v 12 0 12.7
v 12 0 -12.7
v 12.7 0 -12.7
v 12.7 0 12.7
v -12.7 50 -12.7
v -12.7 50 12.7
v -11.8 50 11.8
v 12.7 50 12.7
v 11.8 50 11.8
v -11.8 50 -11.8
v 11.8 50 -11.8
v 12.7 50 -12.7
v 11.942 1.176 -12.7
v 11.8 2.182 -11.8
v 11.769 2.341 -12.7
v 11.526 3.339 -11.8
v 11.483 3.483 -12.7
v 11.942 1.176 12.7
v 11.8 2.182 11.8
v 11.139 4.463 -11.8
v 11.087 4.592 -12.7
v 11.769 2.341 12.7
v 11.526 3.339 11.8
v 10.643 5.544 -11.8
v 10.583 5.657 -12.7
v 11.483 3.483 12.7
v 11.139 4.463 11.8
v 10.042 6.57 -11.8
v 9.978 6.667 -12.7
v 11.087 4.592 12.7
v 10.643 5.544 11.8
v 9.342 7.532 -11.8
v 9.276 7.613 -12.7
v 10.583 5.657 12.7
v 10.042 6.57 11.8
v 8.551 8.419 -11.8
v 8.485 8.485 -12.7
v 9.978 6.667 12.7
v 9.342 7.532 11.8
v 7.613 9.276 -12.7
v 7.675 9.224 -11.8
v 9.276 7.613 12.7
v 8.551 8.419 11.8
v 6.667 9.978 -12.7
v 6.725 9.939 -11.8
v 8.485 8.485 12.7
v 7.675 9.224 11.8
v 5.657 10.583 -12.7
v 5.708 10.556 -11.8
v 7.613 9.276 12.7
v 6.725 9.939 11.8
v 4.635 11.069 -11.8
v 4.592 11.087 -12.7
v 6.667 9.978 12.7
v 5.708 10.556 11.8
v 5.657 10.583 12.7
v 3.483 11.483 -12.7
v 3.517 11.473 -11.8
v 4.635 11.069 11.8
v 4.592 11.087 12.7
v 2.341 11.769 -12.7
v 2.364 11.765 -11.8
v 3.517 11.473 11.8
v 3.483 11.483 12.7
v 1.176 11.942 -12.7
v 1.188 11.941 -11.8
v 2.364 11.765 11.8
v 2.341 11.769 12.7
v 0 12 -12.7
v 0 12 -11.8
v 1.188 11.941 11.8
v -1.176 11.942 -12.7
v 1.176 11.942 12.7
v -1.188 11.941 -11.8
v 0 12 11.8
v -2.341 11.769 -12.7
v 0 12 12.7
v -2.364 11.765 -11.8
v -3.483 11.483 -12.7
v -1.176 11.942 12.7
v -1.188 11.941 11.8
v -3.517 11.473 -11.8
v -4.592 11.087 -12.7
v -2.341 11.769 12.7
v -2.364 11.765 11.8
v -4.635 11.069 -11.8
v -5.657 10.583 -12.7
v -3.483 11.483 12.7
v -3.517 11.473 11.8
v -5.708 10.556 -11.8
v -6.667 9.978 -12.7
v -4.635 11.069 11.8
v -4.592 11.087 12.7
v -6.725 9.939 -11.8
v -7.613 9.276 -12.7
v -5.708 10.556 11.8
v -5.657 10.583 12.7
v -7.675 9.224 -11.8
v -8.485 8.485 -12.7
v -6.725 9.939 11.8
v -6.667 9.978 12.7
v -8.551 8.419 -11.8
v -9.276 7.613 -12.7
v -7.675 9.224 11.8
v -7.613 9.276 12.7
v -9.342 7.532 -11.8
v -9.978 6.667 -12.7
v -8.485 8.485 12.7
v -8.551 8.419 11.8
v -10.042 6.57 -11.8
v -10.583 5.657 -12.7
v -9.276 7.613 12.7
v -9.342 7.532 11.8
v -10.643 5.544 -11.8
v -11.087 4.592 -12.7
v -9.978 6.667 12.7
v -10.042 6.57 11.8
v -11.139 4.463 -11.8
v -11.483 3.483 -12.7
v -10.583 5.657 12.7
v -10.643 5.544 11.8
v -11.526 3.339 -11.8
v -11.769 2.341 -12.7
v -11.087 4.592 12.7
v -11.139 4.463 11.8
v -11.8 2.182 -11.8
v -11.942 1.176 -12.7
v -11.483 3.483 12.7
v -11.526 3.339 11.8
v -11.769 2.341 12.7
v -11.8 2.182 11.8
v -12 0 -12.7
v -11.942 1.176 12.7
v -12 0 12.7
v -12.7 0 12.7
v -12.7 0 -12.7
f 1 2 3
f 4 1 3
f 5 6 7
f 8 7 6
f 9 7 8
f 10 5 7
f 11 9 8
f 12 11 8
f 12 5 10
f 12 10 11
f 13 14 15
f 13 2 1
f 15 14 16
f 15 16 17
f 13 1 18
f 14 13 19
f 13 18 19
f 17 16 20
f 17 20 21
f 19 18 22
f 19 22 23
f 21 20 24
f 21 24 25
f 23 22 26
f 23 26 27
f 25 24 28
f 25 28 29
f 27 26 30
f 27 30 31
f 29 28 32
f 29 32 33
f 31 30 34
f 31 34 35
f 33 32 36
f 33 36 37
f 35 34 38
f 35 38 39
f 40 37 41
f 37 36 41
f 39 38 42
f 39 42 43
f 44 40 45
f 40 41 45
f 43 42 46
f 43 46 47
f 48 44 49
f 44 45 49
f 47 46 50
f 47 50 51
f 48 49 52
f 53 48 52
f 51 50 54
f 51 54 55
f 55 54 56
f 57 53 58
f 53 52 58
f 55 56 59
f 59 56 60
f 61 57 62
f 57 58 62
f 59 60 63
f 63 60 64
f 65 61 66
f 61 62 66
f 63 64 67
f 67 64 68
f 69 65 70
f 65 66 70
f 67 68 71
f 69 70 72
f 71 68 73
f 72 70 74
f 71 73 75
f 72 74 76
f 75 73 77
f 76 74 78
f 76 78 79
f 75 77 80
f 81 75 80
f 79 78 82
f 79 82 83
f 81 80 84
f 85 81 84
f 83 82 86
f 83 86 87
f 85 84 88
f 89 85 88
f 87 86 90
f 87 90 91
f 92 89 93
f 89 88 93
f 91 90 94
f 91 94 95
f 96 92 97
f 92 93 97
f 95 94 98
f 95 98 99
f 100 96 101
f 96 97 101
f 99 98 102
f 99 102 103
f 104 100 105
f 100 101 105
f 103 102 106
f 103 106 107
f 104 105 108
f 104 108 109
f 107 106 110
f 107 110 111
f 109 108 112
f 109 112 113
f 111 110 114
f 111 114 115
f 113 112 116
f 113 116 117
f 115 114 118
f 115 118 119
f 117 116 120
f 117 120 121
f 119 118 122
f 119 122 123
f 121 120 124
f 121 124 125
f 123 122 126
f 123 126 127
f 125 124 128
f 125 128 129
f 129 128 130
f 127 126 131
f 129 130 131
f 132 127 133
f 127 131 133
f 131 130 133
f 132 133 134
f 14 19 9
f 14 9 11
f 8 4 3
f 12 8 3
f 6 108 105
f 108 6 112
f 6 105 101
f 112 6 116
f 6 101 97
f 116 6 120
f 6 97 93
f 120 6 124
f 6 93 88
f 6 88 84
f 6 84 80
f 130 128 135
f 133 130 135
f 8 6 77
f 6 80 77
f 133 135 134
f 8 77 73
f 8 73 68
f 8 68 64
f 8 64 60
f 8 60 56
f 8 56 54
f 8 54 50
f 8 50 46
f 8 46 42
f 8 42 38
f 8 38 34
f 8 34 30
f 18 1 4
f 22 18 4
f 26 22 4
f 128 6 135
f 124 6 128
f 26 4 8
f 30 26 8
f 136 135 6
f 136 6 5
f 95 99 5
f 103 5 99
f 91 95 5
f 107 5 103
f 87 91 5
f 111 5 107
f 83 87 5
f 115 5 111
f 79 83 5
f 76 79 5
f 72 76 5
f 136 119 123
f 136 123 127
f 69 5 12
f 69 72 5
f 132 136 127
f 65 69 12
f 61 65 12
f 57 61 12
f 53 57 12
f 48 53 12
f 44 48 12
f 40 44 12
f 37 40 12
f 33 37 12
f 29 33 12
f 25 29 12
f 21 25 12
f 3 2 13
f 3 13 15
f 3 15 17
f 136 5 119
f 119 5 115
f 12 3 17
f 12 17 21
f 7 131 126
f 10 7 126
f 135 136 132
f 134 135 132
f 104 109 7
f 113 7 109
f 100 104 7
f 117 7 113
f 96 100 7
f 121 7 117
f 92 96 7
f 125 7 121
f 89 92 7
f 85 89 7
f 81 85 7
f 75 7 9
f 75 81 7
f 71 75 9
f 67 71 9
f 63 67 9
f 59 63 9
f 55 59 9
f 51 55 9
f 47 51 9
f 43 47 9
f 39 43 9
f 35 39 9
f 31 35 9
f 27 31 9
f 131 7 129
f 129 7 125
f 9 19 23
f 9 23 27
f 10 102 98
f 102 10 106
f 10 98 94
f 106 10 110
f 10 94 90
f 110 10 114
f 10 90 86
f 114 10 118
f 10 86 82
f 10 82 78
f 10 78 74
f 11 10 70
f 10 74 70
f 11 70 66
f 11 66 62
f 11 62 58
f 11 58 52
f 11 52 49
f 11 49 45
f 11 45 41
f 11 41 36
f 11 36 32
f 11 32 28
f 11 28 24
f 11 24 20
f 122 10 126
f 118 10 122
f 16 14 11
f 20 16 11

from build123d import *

# Parameters (mm, degrees)
SKETCH1_W           = 25.4
SKETCH1_H           = 25.4
SKETCH1_W_2         = 23.6
SKETCH1_H_2         = 23.6
BOSS_EXTRUDE1_DEPTH = 50
CUT_EXTRUDE1_DEPTH  = 25.4


with BuildPart() as part:
    # Sketch1 → Boss-Extrude1 (new body)
    with BuildSketch(Plane(origin=(0, 0, 0), x_dir=(1, 0, 0), z_dir=(0, 1, 0))):
        Rectangle(SKETCH1_W, SKETCH1_H)
        Rectangle(SKETCH1_W_2, SKETCH1_H_2, mode=Mode.SUBTRACT)
    extrude(amount=BOSS_EXTRUDE1_DEPTH)

    # Sketch2 → Cut-Extrude1 (cut)
    with BuildSketch(Plane.XY.offset(12.7)):
        with BuildLine():
            Line((-12, 0), (12, 0))
            ThreePointArc((12, 0), (0, 12), (-12, 0))
        make_face()
    extrude(amount=-CUT_EXTRUDE1_DEPTH, mode=Mode.SUBTRACT)


solid = part.part
